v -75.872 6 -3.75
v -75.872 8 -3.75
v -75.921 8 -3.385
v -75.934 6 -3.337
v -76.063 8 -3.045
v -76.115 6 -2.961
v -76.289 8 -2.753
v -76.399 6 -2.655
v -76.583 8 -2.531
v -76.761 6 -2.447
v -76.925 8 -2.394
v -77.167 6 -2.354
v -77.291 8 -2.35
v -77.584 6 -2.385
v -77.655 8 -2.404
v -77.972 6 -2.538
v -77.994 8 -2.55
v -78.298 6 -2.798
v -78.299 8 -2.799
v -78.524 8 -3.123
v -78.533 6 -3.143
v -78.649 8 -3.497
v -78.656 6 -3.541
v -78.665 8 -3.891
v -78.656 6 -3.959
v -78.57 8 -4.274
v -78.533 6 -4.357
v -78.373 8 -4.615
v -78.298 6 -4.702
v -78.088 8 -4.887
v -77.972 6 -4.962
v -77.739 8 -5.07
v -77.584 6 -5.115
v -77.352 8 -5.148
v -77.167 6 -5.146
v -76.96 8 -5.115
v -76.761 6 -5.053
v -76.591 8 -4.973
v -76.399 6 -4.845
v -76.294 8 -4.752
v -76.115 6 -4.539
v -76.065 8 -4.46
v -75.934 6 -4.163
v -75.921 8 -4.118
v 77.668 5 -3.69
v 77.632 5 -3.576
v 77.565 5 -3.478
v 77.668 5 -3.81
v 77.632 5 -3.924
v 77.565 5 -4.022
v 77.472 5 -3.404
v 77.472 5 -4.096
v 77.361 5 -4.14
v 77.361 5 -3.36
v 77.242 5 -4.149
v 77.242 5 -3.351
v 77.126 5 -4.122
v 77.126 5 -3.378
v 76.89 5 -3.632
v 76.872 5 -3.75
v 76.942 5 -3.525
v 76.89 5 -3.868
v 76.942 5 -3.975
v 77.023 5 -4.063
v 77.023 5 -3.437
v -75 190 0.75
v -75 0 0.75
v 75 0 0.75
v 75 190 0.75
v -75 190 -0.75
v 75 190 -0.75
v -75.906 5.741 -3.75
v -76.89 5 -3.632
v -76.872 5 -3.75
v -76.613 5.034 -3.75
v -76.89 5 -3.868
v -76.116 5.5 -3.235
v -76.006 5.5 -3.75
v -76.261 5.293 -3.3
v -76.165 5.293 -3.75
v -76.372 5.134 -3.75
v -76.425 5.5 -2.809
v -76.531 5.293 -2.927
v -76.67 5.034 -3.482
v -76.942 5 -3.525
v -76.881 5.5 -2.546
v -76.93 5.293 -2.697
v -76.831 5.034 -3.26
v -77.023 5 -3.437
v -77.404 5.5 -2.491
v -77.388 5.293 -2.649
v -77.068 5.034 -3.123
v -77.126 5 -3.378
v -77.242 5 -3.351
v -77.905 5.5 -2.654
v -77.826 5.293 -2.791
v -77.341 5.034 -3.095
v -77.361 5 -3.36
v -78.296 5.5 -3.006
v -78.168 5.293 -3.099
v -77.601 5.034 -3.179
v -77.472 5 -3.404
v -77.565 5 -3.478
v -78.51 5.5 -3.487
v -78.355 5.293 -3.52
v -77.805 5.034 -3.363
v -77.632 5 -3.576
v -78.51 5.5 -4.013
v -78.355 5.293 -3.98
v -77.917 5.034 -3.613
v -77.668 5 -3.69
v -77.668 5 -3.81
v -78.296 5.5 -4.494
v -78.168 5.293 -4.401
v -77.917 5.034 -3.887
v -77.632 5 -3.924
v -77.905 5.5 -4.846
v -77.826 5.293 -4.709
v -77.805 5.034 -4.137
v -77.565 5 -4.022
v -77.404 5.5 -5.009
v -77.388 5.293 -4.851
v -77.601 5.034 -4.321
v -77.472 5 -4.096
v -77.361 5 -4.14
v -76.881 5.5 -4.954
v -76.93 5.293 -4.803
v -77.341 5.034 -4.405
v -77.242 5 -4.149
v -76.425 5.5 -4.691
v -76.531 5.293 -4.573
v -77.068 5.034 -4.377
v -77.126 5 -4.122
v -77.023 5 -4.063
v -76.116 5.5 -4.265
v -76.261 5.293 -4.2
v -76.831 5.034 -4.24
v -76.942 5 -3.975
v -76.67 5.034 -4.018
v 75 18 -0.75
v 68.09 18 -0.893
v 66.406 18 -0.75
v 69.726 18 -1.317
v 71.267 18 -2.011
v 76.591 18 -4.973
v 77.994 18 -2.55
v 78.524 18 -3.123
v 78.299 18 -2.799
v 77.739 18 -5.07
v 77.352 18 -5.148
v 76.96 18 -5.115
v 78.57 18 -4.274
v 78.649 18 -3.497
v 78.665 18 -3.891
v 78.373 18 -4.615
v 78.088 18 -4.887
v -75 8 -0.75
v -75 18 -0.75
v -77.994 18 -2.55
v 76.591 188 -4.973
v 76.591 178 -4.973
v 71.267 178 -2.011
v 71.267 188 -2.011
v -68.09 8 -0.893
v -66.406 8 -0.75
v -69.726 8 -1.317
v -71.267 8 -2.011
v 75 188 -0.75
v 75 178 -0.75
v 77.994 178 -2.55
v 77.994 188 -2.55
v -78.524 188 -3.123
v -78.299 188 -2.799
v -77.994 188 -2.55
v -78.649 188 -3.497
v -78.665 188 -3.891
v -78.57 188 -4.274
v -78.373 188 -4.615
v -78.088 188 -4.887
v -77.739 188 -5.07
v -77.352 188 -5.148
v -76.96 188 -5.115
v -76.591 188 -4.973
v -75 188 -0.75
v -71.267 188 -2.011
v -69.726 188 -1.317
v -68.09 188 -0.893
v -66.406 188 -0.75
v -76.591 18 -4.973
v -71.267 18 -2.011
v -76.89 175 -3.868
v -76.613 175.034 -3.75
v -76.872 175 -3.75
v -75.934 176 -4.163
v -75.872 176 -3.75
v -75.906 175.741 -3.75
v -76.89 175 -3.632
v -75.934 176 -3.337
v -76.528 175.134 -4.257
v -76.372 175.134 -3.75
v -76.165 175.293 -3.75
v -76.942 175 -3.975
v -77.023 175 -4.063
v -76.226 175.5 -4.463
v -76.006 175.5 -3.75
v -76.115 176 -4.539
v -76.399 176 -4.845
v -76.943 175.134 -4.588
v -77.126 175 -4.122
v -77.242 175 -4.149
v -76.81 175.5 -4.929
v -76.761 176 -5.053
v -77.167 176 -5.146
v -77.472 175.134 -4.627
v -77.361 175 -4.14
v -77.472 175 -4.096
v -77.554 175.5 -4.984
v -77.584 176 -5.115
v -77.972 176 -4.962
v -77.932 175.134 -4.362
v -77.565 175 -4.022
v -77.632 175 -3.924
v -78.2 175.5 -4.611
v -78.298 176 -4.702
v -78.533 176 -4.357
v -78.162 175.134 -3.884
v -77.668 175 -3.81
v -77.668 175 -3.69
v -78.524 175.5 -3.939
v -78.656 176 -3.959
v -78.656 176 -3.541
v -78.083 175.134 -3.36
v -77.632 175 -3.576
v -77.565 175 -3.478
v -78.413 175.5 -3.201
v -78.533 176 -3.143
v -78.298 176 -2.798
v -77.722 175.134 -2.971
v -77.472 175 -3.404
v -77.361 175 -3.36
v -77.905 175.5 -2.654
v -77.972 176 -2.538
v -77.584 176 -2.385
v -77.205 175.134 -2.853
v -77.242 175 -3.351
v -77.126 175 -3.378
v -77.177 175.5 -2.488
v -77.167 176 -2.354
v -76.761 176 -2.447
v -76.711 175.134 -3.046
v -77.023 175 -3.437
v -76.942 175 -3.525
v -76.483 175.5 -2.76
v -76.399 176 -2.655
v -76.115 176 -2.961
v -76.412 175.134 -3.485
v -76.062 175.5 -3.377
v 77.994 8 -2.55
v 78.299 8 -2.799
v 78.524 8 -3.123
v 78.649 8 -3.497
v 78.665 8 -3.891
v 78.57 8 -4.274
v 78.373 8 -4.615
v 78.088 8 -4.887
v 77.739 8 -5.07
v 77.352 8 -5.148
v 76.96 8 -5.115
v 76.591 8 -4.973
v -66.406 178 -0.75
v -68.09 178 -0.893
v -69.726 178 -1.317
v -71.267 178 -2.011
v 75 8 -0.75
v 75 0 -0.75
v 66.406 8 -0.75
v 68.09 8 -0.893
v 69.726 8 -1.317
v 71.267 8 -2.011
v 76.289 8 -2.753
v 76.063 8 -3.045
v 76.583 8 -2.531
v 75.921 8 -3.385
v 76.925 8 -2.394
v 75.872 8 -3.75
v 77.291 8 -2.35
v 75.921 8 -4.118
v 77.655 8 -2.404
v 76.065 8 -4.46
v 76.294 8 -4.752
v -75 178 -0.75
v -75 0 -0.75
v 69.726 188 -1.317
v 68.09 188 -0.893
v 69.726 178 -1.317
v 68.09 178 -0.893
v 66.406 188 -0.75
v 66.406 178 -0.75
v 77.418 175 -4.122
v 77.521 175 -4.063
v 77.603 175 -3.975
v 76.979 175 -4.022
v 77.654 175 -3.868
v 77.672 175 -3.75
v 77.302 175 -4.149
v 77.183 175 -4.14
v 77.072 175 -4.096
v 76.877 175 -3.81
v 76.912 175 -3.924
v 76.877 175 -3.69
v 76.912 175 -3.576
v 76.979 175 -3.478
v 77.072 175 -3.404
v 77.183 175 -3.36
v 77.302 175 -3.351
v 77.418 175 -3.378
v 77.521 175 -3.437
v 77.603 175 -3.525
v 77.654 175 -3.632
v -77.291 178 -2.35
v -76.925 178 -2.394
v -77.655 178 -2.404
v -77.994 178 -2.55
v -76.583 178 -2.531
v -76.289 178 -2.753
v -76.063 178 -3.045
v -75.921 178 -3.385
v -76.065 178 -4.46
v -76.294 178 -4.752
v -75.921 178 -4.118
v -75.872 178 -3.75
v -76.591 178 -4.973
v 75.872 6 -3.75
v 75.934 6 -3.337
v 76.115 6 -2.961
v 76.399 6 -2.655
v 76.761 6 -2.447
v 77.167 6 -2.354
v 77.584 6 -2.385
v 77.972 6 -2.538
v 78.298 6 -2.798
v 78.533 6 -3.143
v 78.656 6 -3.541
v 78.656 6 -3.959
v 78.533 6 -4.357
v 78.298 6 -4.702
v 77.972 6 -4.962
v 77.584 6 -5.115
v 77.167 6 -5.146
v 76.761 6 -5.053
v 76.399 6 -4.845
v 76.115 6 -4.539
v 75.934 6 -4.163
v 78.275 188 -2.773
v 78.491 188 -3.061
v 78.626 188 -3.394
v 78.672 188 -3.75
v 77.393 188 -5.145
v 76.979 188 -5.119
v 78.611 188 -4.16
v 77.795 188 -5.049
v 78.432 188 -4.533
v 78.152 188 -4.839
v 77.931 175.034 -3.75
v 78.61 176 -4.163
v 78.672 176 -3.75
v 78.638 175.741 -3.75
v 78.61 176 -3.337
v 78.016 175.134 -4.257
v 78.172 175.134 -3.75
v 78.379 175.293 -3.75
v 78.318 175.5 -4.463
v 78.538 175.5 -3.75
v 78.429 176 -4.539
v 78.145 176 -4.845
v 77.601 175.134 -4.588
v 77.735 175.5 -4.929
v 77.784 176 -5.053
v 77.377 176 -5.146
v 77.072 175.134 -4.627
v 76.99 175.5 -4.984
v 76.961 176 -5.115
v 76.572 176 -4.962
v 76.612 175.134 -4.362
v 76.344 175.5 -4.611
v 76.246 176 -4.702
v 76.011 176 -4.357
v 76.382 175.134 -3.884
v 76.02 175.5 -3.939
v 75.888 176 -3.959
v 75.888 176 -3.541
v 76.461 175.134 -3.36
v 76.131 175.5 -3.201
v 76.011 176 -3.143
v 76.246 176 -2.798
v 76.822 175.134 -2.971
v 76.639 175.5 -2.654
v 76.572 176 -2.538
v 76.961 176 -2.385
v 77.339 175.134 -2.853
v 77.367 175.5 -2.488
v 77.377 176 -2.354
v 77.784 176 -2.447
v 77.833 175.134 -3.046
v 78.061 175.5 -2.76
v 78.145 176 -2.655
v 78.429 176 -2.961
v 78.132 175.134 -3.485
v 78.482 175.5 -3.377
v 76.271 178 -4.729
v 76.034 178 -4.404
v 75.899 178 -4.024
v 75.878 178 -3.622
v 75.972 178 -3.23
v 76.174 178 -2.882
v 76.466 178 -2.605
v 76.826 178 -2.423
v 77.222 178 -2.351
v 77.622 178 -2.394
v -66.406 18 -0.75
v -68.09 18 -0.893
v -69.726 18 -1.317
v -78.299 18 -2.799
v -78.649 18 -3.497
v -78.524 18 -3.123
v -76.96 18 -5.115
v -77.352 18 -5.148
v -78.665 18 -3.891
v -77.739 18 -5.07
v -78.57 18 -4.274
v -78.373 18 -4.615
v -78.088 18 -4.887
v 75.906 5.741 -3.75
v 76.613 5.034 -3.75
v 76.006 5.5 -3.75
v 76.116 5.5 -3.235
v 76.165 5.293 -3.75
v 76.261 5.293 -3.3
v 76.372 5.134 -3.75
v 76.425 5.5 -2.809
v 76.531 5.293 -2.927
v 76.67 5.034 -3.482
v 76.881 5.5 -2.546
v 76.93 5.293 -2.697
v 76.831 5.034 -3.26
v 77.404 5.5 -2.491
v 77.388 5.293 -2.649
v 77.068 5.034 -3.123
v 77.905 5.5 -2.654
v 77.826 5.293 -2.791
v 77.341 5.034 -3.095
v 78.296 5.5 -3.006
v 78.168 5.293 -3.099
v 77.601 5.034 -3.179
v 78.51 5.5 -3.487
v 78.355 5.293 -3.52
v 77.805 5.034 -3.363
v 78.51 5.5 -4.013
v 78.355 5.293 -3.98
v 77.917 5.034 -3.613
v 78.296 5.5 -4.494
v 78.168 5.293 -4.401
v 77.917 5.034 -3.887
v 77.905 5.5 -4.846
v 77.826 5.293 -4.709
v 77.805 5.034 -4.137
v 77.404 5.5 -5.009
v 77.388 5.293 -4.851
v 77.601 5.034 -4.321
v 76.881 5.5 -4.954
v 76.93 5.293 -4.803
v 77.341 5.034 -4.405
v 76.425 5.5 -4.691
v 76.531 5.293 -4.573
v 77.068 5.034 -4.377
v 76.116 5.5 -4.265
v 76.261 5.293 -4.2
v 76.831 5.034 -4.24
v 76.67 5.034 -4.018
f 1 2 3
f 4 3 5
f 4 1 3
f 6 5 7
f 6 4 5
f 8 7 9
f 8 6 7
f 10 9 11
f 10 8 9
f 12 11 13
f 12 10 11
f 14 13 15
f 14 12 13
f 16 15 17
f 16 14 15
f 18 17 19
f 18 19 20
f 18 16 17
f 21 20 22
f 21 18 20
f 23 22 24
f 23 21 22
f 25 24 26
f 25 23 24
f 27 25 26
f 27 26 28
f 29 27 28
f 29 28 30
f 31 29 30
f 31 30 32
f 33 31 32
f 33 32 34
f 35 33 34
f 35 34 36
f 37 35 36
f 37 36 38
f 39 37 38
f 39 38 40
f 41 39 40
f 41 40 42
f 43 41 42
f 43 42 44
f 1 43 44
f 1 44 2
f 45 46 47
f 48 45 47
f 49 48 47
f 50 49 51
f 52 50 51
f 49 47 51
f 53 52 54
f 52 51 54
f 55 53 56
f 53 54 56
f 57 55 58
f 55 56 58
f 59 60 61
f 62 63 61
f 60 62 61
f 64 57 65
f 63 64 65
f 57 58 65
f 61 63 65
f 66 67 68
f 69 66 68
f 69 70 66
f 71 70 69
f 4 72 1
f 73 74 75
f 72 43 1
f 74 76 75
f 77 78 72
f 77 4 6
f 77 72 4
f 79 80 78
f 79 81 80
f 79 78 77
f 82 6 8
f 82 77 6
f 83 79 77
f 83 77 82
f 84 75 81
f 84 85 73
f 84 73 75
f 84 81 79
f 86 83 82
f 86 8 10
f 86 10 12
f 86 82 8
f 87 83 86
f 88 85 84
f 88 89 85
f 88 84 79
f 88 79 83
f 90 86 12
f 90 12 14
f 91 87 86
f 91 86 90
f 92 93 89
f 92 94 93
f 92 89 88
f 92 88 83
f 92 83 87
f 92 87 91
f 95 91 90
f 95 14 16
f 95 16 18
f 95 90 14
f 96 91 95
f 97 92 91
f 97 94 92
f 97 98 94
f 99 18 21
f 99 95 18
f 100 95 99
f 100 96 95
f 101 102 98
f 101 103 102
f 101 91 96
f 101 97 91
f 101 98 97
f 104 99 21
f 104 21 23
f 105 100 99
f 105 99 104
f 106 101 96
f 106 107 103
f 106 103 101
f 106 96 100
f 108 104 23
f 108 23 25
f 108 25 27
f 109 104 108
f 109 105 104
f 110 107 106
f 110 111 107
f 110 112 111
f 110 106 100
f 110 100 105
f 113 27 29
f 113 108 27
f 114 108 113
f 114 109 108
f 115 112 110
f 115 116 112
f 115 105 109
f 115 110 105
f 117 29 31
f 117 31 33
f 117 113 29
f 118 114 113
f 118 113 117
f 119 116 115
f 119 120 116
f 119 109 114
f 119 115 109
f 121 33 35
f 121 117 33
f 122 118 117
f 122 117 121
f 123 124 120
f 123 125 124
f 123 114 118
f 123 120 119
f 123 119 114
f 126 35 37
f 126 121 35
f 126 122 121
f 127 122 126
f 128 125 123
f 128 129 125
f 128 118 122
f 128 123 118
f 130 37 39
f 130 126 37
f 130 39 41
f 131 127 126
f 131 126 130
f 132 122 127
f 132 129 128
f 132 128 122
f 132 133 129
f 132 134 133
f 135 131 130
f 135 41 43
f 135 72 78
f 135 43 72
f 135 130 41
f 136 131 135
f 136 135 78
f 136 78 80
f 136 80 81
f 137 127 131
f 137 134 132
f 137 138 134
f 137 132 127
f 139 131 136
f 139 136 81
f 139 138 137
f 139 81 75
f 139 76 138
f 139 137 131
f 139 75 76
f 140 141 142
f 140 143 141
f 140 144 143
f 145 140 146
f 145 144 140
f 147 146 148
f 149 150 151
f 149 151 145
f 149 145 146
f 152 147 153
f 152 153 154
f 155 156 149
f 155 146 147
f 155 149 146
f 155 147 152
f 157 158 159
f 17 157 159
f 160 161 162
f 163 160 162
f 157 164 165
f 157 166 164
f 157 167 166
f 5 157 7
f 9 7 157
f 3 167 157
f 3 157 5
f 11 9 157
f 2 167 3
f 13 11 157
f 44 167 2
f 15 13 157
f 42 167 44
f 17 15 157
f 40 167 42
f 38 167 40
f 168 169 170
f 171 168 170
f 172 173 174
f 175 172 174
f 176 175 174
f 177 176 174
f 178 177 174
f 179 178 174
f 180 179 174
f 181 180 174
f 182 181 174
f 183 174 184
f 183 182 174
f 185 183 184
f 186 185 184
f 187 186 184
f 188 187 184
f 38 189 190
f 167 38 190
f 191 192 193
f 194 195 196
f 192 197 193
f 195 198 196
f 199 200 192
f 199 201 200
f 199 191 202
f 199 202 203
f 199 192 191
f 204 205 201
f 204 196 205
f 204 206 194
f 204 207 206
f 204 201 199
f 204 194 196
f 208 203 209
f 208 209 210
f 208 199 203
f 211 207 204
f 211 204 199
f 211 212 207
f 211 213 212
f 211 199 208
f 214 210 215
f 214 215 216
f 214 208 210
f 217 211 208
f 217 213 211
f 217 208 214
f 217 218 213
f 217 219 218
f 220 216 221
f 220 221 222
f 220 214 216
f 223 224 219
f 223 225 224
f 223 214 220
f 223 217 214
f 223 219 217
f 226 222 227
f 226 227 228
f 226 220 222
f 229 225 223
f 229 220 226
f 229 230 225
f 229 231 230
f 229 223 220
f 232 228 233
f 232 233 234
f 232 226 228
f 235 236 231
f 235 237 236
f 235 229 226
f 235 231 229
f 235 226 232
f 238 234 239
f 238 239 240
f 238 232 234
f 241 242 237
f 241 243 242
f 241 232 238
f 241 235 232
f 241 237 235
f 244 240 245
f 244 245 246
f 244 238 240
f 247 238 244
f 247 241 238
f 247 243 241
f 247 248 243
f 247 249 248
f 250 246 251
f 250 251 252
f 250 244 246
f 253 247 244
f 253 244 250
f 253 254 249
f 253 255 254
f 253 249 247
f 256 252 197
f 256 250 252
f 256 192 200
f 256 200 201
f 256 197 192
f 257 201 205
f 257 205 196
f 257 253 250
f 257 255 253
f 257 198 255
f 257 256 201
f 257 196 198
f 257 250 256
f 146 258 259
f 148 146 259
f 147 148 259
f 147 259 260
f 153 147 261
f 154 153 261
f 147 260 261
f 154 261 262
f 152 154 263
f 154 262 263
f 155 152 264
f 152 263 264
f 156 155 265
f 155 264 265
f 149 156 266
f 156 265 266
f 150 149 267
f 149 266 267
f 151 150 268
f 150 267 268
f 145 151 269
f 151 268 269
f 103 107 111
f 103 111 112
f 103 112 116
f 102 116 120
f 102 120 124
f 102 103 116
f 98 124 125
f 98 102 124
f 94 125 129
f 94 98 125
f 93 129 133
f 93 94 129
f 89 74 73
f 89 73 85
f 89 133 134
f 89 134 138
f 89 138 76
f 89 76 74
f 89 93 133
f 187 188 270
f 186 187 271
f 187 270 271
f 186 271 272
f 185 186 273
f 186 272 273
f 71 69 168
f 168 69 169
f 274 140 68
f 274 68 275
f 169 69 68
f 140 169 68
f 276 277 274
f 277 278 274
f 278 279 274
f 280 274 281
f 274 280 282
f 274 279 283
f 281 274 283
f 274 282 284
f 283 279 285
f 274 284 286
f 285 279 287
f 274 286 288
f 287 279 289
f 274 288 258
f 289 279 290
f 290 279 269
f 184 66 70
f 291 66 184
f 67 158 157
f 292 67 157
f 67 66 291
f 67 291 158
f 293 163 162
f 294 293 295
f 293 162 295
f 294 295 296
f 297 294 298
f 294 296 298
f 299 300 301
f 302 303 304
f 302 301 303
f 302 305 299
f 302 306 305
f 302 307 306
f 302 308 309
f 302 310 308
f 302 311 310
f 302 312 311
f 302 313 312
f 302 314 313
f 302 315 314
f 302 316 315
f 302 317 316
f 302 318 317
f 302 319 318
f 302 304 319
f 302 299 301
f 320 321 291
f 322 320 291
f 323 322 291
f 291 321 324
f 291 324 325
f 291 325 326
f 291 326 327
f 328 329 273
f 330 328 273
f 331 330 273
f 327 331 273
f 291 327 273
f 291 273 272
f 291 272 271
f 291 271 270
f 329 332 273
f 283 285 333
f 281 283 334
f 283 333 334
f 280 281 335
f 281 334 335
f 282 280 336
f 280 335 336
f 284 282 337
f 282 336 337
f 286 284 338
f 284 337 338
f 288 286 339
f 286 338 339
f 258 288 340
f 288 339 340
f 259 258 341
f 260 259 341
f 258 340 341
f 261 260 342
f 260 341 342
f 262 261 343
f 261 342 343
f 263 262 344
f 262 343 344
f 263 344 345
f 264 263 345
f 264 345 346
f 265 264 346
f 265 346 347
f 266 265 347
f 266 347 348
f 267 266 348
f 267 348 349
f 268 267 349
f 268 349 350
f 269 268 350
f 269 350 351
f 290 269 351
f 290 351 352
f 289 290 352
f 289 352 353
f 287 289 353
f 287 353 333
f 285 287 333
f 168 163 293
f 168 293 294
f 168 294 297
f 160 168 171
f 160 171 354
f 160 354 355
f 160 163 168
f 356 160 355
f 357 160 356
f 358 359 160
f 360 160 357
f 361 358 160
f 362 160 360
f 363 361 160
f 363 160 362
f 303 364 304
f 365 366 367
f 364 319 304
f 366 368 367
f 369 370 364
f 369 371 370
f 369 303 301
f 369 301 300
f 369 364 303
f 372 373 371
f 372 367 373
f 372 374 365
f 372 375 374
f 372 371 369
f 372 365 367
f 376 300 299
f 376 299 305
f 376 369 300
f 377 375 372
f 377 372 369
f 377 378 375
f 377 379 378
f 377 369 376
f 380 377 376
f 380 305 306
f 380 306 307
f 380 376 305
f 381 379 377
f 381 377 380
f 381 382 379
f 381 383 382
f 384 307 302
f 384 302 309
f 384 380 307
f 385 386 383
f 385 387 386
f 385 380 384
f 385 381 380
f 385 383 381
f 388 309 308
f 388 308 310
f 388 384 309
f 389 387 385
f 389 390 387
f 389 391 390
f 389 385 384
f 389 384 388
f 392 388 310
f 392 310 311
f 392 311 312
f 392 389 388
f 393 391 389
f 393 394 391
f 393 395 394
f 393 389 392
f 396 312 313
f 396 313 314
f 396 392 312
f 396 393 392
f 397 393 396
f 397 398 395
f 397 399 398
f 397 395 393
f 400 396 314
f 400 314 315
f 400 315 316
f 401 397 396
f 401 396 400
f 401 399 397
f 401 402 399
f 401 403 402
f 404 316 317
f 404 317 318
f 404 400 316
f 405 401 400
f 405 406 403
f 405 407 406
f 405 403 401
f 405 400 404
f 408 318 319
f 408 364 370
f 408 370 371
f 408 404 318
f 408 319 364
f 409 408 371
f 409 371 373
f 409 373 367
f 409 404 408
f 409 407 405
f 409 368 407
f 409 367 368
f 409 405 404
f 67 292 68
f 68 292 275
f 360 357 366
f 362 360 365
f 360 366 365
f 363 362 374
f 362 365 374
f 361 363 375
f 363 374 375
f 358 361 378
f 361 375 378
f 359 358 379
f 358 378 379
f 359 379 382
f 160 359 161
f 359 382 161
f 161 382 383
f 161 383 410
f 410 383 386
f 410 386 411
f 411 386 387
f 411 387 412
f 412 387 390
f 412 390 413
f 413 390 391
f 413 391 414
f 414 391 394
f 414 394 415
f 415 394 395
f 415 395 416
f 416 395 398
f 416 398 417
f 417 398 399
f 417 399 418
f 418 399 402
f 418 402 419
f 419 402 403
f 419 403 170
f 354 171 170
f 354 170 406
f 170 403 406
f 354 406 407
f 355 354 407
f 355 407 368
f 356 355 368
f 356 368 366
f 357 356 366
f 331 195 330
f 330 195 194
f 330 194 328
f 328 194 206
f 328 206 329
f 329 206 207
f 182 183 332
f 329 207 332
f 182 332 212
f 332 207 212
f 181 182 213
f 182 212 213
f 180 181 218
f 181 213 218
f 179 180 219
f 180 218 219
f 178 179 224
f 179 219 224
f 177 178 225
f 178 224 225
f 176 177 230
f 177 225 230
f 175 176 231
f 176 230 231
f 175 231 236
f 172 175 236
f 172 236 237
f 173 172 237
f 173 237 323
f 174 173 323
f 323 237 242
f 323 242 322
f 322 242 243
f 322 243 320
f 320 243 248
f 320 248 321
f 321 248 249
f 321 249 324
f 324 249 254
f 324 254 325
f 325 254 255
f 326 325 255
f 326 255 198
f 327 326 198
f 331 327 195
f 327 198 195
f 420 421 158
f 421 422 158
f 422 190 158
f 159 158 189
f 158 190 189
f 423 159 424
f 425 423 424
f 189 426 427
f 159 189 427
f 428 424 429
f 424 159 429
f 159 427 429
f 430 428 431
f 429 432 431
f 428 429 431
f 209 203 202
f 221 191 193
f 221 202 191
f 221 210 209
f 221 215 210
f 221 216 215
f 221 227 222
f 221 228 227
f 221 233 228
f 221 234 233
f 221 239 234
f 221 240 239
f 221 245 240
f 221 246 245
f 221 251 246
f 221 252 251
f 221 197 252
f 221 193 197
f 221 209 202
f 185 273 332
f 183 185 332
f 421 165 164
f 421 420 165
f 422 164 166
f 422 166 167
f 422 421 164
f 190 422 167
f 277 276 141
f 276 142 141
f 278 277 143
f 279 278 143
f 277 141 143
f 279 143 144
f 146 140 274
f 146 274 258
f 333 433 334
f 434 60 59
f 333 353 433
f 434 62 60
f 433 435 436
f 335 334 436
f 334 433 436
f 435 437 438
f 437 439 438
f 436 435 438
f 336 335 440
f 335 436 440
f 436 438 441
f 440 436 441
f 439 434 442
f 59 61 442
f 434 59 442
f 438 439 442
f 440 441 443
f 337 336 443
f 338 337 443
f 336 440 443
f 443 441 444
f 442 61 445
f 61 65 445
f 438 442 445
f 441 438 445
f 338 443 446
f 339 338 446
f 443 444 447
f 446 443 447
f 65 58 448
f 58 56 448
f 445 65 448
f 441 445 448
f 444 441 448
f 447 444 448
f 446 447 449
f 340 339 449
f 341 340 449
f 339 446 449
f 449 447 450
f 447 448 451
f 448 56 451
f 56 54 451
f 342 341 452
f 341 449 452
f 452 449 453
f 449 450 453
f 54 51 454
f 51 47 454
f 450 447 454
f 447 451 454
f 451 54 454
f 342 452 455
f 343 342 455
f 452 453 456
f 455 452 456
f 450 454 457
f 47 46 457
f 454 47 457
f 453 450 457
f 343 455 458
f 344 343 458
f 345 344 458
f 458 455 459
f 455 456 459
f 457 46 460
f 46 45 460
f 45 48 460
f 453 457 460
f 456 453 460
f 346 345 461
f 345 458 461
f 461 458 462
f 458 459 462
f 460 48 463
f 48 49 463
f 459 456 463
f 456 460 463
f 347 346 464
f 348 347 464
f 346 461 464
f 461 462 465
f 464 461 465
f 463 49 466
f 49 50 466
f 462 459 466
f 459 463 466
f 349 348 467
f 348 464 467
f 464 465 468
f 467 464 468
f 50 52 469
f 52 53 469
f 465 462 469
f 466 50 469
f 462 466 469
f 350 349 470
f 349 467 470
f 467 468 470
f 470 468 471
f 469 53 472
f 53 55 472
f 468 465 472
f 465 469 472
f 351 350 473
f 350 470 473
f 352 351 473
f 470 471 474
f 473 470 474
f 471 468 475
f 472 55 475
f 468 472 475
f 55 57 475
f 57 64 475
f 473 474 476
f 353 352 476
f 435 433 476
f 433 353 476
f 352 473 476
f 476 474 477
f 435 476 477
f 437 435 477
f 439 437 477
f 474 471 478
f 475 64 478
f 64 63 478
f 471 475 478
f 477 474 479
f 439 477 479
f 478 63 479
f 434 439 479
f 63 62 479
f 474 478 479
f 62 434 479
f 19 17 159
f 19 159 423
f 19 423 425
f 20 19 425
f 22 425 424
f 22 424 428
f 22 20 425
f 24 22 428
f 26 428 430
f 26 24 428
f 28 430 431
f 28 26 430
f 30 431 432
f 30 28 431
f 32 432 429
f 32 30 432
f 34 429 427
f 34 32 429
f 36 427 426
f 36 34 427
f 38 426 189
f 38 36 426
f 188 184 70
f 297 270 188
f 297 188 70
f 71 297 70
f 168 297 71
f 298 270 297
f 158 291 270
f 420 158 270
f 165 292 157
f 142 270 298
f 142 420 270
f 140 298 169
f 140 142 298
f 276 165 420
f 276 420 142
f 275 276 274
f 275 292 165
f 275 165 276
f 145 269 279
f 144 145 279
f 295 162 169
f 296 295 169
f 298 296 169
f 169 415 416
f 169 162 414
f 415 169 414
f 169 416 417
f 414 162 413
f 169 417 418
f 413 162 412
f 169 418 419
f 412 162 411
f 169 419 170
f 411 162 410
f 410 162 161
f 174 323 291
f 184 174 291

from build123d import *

# Parameters (mm, degrees)
SKETCH1_W            = 150
SKETCH1_H            = 1.5
BOSS_EXTRUDE1_DEPTH  = 190
BOSS_EXTRUDE2_DEPTH  = 10
BOSS_EXTRUDE3_START  = 3
SKETCH3_R            = 1.4
BOSS_EXTRUDE3_DEPTH  = 3
FILLET1_R            = 1
FILLET2_R            = 10
FILLET1_OF_MIRROR2_R = 1
FILLET2_OF_MIRROR2_R = 10
LPATTERN1_START      = 175.9999999
LPATTERN1_OUTLINE_R  = 1.4
LPATTERN1_DEPTH      = 12.0000001
LPATTERN1_START_2    = 178
LPATTERN1_2_DEPTH    = 10


with BuildPart() as part:
    # Sketch1 → Boss-Extrude1 (new body)
    with BuildSketch(Plane(origin=(0, 0, 0), x_dir=(1, 0, 0), z_dir=(0, 1, 0))):
        Rectangle(SKETCH1_W, SKETCH1_H)
    extrude(amount=BOSS_EXTRUDE1_DEPTH)

    # Sketch2 → Boss-Extrude2 (add)
    with BuildSketch(Plane(origin=(0, 8, 0), x_dir=(1, 0, 0), z_dir=(0, 1, 0))):
        with BuildLine():
            Line((-75, 0.75), (-77.993576193, 2.550233244))
            ThreePointArc((-77.993576193, 2.550233244), (-78.48384028, 4.451164765), (-76.591446047, 4.973413351))
            Line((-76.591446047, 4.973413351), (-69, 0.75))
            Line((-69, 0.75), (-75, 0.75))
        make_face()
    boss_extrude2 = extrude(amount=BOSS_EXTRUDE2_DEPTH)

    # Sketch3 → Boss-Extrude3 (add)
    with BuildSketch(Plane(origin=(0, 8, 0), x_dir=(-1, 0, 0), z_dir=(0, -1, 0)).offset(BOSS_EXTRUDE3_START)):
        with Locations(Location((77.272077939, 3.75, 0), (0, 0, 180))):
            Circle(SKETCH3_R)
    boss_extrude3 = extrude(amount=-BOSS_EXTRUDE3_DEPTH)

    # Fillet1
    fillet1_edges = [part.edges().sort_by_distance(p)[0] for p in [
        (-78.672077939, 5, -3.75),
    ]]
    fillet(fillet1_edges, radius=FILLET1_R)

    # Fillet2
    fillet2_edges = [part.edges().sort_by_distance(p)[0] for p in [
        (-69, 13, -0.75),
    ]]
    fillet(fillet2_edges, radius=FILLET2_R)

    # Mirror2: Boss-Extrude2, Boss-Extrude3 across plane
    add(boss_extrude2.mirror(Plane(origin=(0, 0, 0), x_dir=(0, 0, 1), z_dir=(1, 0, 0))))
    add(boss_extrude3.mirror(Plane(origin=(0, 0, 0), x_dir=(0, 0, 1), z_dir=(1, 0, 0))))

    # Fillet1 of Mirror2
    fillet1_of_mirror2_edges = [part.edges().sort_by_distance(p)[0] for p in [
        (78.672077939, 5, -3.75),
    ]]
    fillet(fillet1_of_mirror2_edges, radius=FILLET1_OF_MIRROR2_R)

    # Fillet2 of Mirror2
    fillet2_of_mirror2_edges = [part.edges().sort_by_distance(p)[0] for p in [
        (69, 13, -0.75),
    ]]
    fillet(fillet2_of_mirror2_edges, radius=FILLET2_OF_MIRROR2_R)



with BuildPart() as body_2:
    # LPattern1: read off the stored shape, not the designer's step
    # LPattern1 outline → LPattern1 (new body)
    with BuildSketch(Plane(origin=(0, 0, 0), x_dir=(1, 0, 0), z_dir=(0, 1, 0)).offset(LPATTERN1_START)):
        with Locations((-77.272077939, 3.75)):
            Circle(LPATTERN1_OUTLINE_R)
        with Locations((77.272077939, 3.75)):
            Circle(LPATTERN1_OUTLINE_R)
    extrude(amount=LPATTERN1_DEPTH)


with BuildPart() as part_1:
    add(part.part)

    add(body_2.part)  # LPattern1 2 merges body 2
    # LPattern1 2 outline → LPattern1 2 (add)
    with BuildSketch(Plane(origin=(0, 0, 0), x_dir=(1, 0, 0), z_dir=(0, 1, 0)).offset(LPATTERN1_START_2)):
        with BuildLine():
            ThreePointArc((71.267204788, 2.011333205), (68.916856052, 1.070468298), (66.40554842, 0.75))
            Line((66.40554842, 0.75), (75, 0.75))
            Line((75, 0.75), (77.993576193, 2.550233244))
            ThreePointArc((77.993576193, 2.550233244), (76.060315597, 3.048835235), (76.591446047, 4.973413351))
            Line((76.591446047, 4.973413351), (71.267204788, 2.011333205))
        make_face()
        with BuildLine():
            Line((-71.267204788, 2.011333205), (-76.591446047, 4.973413351))
            ThreePointArc((-76.591446047, 4.973413351), (-76.060315597, 3.048835235), (-77.993576193, 2.550233244))
            Line((-77.993576193, 2.550233244), (-75, 0.75))
            Line((-75, 0.75), (-66.40554842, 0.75))
            ThreePointArc((-66.40554842, 0.75), (-68.916856052, 1.070468298), (-71.267204788, 2.011333205))
        make_face()
    extrude(amount=LPATTERN1_2_DEPTH)

    # LPattern1 3 outline → LPattern1 3 (revolve)
    with BuildSketch(Plane(origin=(77.272077939, 0, -3.75), x_dir=(1, 0, 0), z_dir=(0, 0, 1))):
        with BuildLine():
            Line((0, 175.9999999), (0, 175))
            Line((0, 175), (0.4, 175))
            ThreePointArc((0.4, 175), (1.107106781, 175.292893219), (1.4, 176))
            Line((1.4, 176), (0, 175.9999999))
        make_face()
    revolve(axis=Axis((77.272077939, 0, -3.75), (0, 1, 0)))

    # LPattern1 4 outline → LPattern1 4 (revolve)
    with BuildSketch(Plane(origin=(-77.272077939, 0, -3.75), x_dir=(1, 0, 0), z_dir=(0, 0, 1))):
        with BuildLine():
            Line((0, 175.9999999), (0, 175))
            Line((0, 175), (0.4, 175))
            ThreePointArc((0.4, 175), (1.107106781, 175.292893219), (1.4, 176))
            Line((1.4, 176), (0, 175.9999999))
        make_face()
    revolve(axis=Axis((-77.272077939, 0, -3.75), (0, 1, 0)))


solid = part_1.part
